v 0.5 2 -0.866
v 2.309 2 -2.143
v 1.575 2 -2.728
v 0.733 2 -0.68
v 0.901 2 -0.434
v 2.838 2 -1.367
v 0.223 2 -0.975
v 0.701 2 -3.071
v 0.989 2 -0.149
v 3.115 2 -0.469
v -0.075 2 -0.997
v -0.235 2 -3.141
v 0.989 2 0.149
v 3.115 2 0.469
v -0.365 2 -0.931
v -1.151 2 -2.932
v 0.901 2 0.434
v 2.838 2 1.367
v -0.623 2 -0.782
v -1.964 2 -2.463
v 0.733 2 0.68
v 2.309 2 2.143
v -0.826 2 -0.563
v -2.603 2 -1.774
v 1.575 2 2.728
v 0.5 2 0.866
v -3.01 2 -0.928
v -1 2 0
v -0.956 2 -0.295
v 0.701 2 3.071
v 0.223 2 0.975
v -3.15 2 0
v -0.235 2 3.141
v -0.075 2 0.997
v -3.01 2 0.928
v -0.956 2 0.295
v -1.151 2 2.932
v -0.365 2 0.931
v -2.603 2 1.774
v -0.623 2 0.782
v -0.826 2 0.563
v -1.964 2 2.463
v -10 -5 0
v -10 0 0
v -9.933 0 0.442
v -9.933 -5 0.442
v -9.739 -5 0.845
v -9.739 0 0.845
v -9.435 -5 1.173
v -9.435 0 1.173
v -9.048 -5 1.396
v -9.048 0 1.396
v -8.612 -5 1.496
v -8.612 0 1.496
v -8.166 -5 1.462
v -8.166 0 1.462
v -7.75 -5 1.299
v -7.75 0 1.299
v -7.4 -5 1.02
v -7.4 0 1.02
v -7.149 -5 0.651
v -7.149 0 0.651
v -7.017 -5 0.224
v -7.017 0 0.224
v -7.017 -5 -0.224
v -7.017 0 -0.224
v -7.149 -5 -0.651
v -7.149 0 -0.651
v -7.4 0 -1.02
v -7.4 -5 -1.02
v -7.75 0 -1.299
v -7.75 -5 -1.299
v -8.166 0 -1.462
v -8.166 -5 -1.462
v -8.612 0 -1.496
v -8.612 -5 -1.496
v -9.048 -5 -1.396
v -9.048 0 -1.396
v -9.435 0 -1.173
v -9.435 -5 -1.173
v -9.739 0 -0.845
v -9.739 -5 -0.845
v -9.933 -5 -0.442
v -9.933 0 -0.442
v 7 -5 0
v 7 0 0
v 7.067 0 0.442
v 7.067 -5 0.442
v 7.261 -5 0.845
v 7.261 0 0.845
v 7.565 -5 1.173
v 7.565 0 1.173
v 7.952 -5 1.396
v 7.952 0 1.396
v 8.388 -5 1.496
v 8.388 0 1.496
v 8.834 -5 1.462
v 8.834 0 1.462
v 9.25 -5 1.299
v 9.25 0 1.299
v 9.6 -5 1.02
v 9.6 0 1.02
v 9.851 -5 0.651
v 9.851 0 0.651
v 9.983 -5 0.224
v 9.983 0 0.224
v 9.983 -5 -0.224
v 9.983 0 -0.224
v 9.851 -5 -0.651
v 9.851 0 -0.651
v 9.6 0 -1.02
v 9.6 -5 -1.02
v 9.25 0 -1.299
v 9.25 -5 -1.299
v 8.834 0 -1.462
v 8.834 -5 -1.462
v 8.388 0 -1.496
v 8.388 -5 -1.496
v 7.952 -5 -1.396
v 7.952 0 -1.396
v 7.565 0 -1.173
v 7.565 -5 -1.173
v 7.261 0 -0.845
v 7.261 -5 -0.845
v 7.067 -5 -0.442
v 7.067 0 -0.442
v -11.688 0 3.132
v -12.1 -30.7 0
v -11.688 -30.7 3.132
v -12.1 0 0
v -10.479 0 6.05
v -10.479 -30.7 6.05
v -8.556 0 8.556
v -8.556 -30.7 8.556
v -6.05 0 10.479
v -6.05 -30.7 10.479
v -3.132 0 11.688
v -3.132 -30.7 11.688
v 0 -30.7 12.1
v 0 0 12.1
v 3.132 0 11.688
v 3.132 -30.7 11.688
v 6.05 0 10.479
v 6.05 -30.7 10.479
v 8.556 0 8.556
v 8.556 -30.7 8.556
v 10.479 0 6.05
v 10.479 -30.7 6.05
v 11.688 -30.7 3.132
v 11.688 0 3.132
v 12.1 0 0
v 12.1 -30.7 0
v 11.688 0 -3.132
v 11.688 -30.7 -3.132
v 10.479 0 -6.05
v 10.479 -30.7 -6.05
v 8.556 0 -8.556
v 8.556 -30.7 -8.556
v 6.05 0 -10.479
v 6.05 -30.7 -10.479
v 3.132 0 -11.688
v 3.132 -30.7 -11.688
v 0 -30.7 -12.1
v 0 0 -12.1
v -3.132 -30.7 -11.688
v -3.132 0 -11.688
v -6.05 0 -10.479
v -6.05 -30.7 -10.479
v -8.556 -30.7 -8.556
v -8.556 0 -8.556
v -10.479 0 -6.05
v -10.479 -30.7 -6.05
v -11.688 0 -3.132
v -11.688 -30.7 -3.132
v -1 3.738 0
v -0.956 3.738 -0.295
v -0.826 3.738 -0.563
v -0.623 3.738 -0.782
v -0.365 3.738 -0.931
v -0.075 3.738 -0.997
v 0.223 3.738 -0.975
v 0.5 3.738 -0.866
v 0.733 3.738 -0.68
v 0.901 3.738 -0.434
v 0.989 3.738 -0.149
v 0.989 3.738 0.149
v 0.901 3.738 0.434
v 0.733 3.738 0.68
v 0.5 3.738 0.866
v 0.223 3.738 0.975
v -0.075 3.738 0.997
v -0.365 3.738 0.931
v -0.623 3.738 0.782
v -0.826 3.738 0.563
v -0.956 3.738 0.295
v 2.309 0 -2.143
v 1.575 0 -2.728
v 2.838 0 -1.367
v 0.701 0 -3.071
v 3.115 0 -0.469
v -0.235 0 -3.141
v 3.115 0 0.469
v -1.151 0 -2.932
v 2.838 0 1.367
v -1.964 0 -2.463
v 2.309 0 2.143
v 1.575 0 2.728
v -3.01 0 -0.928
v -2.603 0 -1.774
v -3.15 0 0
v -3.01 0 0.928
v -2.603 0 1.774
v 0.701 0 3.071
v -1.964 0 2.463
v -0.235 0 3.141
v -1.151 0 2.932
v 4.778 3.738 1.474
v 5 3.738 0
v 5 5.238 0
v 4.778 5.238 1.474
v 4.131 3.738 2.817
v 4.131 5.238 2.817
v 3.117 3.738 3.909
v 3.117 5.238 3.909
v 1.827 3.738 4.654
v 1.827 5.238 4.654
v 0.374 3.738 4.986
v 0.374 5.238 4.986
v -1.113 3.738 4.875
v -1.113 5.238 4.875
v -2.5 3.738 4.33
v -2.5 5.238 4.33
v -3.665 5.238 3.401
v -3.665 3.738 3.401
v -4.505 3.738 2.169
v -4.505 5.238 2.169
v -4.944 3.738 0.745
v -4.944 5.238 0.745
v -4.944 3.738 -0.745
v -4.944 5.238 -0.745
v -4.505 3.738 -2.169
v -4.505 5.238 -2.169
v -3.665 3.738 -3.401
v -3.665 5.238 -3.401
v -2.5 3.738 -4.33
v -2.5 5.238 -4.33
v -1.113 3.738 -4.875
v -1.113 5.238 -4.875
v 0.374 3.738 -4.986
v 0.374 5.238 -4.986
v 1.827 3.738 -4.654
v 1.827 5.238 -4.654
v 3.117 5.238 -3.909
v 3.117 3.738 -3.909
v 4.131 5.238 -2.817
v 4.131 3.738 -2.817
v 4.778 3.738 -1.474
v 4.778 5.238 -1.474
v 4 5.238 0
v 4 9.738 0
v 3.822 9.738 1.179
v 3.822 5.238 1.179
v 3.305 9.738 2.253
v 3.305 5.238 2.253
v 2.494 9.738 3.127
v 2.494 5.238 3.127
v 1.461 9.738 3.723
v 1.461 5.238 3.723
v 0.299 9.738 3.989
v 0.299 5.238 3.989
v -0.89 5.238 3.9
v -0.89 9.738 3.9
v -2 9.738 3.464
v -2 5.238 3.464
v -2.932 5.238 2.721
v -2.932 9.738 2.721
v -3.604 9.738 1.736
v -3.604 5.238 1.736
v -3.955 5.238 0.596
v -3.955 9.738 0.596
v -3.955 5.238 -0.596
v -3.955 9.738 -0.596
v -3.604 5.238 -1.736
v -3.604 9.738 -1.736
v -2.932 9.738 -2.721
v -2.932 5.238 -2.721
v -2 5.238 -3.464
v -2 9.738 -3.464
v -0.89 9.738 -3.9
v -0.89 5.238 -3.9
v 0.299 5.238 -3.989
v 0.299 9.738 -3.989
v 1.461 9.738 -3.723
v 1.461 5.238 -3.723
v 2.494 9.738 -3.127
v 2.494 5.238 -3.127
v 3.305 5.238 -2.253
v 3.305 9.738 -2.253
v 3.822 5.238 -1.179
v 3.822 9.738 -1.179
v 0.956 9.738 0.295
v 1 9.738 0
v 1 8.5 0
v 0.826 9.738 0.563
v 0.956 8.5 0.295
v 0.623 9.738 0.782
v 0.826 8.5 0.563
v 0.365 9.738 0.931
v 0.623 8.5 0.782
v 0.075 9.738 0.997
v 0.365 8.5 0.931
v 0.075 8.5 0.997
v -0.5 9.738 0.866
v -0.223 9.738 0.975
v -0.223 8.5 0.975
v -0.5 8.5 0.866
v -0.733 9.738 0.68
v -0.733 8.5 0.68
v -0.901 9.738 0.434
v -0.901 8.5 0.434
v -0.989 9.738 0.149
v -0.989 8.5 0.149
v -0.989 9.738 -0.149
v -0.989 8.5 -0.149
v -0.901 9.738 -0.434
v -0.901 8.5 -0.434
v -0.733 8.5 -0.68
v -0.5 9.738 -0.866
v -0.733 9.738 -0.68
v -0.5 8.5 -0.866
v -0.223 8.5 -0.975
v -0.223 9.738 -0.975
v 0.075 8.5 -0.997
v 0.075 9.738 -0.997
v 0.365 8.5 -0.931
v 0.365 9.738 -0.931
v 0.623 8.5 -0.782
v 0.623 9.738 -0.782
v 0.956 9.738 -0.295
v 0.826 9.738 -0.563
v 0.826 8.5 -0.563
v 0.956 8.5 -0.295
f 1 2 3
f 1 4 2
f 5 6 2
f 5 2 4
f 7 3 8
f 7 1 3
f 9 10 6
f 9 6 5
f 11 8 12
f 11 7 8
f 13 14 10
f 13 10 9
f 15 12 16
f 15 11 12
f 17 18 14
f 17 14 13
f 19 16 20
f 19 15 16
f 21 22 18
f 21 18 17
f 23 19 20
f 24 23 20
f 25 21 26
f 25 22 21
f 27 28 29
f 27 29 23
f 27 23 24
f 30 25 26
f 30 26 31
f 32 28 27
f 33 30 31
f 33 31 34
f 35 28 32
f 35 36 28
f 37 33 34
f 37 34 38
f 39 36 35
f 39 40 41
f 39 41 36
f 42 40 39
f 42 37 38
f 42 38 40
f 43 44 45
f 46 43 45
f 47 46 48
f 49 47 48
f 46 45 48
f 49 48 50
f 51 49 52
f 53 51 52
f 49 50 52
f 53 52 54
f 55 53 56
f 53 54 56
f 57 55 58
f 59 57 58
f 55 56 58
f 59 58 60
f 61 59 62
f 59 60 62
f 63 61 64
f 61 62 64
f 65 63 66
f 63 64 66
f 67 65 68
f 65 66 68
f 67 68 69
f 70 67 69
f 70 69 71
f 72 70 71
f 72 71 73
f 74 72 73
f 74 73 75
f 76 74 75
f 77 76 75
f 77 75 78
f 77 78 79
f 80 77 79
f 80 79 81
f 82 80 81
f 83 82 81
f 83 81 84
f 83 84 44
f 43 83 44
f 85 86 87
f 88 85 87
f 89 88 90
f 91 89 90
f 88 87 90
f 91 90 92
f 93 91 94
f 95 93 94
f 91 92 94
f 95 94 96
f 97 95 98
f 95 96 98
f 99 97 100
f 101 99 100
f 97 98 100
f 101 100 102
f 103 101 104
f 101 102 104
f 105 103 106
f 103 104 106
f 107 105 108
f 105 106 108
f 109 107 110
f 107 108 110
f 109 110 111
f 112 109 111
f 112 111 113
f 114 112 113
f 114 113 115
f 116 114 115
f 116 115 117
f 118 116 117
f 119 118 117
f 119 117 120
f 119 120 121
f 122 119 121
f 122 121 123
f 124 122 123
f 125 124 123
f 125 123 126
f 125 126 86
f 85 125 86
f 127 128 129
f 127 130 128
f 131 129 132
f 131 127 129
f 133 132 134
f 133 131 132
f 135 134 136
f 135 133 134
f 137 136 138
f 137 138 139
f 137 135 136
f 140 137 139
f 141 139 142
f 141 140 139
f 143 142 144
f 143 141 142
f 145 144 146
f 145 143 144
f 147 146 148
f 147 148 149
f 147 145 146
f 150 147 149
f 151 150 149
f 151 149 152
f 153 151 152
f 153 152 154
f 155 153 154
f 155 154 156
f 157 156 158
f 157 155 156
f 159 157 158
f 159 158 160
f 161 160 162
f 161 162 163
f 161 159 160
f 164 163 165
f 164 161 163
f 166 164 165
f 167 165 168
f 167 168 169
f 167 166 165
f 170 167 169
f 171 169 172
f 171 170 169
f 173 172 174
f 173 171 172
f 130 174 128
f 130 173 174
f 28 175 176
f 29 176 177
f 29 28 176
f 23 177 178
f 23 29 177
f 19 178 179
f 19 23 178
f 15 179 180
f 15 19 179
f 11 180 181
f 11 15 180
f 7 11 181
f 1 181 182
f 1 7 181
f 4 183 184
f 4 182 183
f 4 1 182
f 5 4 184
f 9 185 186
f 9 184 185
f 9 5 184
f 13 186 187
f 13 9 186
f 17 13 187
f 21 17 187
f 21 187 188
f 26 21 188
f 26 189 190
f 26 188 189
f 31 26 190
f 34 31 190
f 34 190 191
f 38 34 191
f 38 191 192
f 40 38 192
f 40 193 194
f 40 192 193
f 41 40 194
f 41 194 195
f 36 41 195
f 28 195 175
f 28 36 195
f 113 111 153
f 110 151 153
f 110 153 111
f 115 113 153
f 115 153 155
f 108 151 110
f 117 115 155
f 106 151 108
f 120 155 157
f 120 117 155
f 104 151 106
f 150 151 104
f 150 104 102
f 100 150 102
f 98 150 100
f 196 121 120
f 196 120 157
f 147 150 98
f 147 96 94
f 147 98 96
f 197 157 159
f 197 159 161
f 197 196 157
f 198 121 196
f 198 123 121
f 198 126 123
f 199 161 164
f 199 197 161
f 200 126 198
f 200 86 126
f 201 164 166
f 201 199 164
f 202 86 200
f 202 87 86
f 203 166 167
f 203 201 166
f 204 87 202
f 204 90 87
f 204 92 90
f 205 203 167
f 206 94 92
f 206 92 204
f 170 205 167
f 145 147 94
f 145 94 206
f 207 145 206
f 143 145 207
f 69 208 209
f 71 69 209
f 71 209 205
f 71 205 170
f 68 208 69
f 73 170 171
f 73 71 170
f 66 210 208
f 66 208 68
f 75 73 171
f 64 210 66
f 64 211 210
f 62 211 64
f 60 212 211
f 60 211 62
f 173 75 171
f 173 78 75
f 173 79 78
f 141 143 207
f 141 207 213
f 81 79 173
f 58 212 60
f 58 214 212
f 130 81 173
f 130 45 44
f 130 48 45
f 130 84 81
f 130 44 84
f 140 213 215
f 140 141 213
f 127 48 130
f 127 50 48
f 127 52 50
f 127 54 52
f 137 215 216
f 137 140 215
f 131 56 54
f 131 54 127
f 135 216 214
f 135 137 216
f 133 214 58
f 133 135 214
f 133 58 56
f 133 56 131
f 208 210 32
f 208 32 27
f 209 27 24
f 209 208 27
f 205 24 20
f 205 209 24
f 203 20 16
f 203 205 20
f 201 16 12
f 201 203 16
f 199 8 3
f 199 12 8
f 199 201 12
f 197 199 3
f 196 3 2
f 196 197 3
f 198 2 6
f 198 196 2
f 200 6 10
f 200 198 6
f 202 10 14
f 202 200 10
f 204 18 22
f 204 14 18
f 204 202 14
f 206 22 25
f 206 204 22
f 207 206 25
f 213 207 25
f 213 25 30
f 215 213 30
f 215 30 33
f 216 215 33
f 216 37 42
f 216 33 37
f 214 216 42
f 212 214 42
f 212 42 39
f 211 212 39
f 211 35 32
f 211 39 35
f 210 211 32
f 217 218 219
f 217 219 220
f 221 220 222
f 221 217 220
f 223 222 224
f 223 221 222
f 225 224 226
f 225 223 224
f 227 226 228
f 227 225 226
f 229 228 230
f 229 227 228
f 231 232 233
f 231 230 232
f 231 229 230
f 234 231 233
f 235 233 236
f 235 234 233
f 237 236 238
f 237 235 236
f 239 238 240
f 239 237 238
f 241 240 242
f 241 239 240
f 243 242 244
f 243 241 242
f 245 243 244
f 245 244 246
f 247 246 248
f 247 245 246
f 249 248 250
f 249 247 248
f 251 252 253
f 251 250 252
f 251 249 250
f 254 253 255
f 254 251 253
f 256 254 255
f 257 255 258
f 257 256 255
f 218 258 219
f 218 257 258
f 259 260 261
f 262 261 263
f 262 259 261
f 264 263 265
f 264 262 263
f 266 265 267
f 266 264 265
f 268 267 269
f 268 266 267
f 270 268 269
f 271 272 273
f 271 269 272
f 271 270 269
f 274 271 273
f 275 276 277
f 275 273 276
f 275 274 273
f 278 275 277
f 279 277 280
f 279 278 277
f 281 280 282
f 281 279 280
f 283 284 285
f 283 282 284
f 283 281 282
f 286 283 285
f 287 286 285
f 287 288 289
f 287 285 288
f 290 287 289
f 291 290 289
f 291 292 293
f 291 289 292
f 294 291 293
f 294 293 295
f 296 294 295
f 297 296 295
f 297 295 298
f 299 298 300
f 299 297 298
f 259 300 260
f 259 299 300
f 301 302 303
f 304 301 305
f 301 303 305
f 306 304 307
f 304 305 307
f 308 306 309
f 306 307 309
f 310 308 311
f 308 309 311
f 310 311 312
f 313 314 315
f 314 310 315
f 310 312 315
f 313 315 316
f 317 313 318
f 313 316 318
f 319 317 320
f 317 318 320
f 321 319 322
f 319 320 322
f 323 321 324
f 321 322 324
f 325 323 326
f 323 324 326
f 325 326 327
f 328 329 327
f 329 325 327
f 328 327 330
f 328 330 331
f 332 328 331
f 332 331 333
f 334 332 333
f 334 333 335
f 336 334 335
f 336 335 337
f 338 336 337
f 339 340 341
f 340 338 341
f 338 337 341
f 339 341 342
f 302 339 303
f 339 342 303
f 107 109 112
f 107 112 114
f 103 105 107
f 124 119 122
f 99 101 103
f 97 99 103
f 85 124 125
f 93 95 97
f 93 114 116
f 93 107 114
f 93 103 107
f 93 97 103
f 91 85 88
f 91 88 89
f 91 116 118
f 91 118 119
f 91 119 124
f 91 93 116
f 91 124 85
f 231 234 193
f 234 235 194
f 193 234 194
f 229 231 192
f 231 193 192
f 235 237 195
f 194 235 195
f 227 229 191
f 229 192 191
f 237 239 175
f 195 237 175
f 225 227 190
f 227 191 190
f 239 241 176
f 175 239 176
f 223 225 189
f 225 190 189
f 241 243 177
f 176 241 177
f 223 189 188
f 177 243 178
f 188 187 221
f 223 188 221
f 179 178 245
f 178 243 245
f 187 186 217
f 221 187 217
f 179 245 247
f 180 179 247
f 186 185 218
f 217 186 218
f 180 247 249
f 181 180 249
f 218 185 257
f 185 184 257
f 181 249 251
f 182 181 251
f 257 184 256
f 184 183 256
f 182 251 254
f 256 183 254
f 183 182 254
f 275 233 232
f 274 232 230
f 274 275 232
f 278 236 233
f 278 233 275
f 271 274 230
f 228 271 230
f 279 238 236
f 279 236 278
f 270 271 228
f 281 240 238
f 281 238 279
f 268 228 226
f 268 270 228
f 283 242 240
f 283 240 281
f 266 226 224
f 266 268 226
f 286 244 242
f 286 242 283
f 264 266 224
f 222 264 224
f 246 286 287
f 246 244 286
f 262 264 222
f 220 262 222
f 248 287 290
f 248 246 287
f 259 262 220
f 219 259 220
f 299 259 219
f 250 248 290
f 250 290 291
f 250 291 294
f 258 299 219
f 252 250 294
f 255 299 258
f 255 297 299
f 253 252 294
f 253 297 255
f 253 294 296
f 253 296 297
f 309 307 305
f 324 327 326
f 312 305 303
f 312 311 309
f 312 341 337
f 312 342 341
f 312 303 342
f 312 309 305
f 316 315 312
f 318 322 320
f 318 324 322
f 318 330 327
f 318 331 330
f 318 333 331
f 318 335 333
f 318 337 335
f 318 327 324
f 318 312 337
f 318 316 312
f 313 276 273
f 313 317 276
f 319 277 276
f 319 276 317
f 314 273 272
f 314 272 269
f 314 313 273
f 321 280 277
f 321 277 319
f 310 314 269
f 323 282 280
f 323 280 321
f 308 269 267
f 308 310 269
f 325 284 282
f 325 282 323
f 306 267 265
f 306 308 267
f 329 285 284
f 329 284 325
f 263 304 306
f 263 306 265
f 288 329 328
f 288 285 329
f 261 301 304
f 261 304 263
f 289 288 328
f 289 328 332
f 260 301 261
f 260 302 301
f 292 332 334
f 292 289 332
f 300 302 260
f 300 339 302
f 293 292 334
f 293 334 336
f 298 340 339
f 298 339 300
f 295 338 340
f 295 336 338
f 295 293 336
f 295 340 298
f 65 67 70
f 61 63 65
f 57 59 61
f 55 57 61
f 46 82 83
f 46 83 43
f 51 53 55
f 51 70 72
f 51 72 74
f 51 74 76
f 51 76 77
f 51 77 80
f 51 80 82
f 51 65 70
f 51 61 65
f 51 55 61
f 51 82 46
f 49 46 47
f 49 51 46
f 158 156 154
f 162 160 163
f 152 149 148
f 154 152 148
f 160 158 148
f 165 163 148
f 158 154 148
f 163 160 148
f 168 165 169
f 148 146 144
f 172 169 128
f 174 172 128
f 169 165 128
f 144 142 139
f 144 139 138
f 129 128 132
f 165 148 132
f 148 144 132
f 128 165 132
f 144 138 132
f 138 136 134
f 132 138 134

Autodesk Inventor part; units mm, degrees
ref_plane "YZ Plane" through (0, 0, 0) normal (1, 0, 0) x (0, 1, 0)
ref_plane "XZ Plane" through (0, 0, 0) normal (0, 1, 0) x (-1, 0, 0)
ref_plane "XY Plane" through (0, 0, 0) normal (0, 0, 1) x (1, 0, 0)
sketch "Sketch1" plane through (0, 0, 0) normal (0, 1, 0) x (-1, 0, 0)
  circle A0 centre (0, 0) radius 12.1
  circle A1 centre (0, 0) radius 3.15
  circle A2 centre (0, 0) radius 1
  circle A3 centre (-8.5, 0) radius 1.5
  circle A4 centre (8.5, 0) radius 1.5
  dimension "d0" = 24.2
  dimension "d1" = 6.3
  dimension "d6" = 2
  dimension "d16" = 3
  dimension "d17" = 3
  dimension "d18" = 8.5
  dimension "d19" = 8.5
extrude "Extrusion1" add sketch "Sketch1" against normal blind 30.7 contours A0 | A1 | A2 | A3 | A4
extrude "Extrusion2" add sketch "Sketch1" along normal blind 2 contours A1 | A2
extrude "Extrusion3" add sketch "Sketch1" along normal blind 8.5 contours A2
ref_plane "Work Plane1" through (0, 3.7375, 0) normal (0, 1, 0) x (1, 0, 0)
sketch "Sketch2" plane through (0, 3.7375, 0) normal (0, 1, 0) x (1, 0, 0)
  circle A0 centre (0, 0) radius 5
  circle A1 centre (0, 0) radius 1 projected
  circle A2 centre (0, 0) radius 4
  dimension "d10" = 10
  dimension "d11" = 8
extrude "Extrusion4" add sketch "Sketch2" along normal blind 1.5 contours A0 | A2
extrude "Extrusion5" add sketch "Sketch2" along normal blind 6 contours A2
extrude "Extrusion6" cut sketch "Sketch1" against normal blind 5 contours A3 | A4
properties part number "Motor"
